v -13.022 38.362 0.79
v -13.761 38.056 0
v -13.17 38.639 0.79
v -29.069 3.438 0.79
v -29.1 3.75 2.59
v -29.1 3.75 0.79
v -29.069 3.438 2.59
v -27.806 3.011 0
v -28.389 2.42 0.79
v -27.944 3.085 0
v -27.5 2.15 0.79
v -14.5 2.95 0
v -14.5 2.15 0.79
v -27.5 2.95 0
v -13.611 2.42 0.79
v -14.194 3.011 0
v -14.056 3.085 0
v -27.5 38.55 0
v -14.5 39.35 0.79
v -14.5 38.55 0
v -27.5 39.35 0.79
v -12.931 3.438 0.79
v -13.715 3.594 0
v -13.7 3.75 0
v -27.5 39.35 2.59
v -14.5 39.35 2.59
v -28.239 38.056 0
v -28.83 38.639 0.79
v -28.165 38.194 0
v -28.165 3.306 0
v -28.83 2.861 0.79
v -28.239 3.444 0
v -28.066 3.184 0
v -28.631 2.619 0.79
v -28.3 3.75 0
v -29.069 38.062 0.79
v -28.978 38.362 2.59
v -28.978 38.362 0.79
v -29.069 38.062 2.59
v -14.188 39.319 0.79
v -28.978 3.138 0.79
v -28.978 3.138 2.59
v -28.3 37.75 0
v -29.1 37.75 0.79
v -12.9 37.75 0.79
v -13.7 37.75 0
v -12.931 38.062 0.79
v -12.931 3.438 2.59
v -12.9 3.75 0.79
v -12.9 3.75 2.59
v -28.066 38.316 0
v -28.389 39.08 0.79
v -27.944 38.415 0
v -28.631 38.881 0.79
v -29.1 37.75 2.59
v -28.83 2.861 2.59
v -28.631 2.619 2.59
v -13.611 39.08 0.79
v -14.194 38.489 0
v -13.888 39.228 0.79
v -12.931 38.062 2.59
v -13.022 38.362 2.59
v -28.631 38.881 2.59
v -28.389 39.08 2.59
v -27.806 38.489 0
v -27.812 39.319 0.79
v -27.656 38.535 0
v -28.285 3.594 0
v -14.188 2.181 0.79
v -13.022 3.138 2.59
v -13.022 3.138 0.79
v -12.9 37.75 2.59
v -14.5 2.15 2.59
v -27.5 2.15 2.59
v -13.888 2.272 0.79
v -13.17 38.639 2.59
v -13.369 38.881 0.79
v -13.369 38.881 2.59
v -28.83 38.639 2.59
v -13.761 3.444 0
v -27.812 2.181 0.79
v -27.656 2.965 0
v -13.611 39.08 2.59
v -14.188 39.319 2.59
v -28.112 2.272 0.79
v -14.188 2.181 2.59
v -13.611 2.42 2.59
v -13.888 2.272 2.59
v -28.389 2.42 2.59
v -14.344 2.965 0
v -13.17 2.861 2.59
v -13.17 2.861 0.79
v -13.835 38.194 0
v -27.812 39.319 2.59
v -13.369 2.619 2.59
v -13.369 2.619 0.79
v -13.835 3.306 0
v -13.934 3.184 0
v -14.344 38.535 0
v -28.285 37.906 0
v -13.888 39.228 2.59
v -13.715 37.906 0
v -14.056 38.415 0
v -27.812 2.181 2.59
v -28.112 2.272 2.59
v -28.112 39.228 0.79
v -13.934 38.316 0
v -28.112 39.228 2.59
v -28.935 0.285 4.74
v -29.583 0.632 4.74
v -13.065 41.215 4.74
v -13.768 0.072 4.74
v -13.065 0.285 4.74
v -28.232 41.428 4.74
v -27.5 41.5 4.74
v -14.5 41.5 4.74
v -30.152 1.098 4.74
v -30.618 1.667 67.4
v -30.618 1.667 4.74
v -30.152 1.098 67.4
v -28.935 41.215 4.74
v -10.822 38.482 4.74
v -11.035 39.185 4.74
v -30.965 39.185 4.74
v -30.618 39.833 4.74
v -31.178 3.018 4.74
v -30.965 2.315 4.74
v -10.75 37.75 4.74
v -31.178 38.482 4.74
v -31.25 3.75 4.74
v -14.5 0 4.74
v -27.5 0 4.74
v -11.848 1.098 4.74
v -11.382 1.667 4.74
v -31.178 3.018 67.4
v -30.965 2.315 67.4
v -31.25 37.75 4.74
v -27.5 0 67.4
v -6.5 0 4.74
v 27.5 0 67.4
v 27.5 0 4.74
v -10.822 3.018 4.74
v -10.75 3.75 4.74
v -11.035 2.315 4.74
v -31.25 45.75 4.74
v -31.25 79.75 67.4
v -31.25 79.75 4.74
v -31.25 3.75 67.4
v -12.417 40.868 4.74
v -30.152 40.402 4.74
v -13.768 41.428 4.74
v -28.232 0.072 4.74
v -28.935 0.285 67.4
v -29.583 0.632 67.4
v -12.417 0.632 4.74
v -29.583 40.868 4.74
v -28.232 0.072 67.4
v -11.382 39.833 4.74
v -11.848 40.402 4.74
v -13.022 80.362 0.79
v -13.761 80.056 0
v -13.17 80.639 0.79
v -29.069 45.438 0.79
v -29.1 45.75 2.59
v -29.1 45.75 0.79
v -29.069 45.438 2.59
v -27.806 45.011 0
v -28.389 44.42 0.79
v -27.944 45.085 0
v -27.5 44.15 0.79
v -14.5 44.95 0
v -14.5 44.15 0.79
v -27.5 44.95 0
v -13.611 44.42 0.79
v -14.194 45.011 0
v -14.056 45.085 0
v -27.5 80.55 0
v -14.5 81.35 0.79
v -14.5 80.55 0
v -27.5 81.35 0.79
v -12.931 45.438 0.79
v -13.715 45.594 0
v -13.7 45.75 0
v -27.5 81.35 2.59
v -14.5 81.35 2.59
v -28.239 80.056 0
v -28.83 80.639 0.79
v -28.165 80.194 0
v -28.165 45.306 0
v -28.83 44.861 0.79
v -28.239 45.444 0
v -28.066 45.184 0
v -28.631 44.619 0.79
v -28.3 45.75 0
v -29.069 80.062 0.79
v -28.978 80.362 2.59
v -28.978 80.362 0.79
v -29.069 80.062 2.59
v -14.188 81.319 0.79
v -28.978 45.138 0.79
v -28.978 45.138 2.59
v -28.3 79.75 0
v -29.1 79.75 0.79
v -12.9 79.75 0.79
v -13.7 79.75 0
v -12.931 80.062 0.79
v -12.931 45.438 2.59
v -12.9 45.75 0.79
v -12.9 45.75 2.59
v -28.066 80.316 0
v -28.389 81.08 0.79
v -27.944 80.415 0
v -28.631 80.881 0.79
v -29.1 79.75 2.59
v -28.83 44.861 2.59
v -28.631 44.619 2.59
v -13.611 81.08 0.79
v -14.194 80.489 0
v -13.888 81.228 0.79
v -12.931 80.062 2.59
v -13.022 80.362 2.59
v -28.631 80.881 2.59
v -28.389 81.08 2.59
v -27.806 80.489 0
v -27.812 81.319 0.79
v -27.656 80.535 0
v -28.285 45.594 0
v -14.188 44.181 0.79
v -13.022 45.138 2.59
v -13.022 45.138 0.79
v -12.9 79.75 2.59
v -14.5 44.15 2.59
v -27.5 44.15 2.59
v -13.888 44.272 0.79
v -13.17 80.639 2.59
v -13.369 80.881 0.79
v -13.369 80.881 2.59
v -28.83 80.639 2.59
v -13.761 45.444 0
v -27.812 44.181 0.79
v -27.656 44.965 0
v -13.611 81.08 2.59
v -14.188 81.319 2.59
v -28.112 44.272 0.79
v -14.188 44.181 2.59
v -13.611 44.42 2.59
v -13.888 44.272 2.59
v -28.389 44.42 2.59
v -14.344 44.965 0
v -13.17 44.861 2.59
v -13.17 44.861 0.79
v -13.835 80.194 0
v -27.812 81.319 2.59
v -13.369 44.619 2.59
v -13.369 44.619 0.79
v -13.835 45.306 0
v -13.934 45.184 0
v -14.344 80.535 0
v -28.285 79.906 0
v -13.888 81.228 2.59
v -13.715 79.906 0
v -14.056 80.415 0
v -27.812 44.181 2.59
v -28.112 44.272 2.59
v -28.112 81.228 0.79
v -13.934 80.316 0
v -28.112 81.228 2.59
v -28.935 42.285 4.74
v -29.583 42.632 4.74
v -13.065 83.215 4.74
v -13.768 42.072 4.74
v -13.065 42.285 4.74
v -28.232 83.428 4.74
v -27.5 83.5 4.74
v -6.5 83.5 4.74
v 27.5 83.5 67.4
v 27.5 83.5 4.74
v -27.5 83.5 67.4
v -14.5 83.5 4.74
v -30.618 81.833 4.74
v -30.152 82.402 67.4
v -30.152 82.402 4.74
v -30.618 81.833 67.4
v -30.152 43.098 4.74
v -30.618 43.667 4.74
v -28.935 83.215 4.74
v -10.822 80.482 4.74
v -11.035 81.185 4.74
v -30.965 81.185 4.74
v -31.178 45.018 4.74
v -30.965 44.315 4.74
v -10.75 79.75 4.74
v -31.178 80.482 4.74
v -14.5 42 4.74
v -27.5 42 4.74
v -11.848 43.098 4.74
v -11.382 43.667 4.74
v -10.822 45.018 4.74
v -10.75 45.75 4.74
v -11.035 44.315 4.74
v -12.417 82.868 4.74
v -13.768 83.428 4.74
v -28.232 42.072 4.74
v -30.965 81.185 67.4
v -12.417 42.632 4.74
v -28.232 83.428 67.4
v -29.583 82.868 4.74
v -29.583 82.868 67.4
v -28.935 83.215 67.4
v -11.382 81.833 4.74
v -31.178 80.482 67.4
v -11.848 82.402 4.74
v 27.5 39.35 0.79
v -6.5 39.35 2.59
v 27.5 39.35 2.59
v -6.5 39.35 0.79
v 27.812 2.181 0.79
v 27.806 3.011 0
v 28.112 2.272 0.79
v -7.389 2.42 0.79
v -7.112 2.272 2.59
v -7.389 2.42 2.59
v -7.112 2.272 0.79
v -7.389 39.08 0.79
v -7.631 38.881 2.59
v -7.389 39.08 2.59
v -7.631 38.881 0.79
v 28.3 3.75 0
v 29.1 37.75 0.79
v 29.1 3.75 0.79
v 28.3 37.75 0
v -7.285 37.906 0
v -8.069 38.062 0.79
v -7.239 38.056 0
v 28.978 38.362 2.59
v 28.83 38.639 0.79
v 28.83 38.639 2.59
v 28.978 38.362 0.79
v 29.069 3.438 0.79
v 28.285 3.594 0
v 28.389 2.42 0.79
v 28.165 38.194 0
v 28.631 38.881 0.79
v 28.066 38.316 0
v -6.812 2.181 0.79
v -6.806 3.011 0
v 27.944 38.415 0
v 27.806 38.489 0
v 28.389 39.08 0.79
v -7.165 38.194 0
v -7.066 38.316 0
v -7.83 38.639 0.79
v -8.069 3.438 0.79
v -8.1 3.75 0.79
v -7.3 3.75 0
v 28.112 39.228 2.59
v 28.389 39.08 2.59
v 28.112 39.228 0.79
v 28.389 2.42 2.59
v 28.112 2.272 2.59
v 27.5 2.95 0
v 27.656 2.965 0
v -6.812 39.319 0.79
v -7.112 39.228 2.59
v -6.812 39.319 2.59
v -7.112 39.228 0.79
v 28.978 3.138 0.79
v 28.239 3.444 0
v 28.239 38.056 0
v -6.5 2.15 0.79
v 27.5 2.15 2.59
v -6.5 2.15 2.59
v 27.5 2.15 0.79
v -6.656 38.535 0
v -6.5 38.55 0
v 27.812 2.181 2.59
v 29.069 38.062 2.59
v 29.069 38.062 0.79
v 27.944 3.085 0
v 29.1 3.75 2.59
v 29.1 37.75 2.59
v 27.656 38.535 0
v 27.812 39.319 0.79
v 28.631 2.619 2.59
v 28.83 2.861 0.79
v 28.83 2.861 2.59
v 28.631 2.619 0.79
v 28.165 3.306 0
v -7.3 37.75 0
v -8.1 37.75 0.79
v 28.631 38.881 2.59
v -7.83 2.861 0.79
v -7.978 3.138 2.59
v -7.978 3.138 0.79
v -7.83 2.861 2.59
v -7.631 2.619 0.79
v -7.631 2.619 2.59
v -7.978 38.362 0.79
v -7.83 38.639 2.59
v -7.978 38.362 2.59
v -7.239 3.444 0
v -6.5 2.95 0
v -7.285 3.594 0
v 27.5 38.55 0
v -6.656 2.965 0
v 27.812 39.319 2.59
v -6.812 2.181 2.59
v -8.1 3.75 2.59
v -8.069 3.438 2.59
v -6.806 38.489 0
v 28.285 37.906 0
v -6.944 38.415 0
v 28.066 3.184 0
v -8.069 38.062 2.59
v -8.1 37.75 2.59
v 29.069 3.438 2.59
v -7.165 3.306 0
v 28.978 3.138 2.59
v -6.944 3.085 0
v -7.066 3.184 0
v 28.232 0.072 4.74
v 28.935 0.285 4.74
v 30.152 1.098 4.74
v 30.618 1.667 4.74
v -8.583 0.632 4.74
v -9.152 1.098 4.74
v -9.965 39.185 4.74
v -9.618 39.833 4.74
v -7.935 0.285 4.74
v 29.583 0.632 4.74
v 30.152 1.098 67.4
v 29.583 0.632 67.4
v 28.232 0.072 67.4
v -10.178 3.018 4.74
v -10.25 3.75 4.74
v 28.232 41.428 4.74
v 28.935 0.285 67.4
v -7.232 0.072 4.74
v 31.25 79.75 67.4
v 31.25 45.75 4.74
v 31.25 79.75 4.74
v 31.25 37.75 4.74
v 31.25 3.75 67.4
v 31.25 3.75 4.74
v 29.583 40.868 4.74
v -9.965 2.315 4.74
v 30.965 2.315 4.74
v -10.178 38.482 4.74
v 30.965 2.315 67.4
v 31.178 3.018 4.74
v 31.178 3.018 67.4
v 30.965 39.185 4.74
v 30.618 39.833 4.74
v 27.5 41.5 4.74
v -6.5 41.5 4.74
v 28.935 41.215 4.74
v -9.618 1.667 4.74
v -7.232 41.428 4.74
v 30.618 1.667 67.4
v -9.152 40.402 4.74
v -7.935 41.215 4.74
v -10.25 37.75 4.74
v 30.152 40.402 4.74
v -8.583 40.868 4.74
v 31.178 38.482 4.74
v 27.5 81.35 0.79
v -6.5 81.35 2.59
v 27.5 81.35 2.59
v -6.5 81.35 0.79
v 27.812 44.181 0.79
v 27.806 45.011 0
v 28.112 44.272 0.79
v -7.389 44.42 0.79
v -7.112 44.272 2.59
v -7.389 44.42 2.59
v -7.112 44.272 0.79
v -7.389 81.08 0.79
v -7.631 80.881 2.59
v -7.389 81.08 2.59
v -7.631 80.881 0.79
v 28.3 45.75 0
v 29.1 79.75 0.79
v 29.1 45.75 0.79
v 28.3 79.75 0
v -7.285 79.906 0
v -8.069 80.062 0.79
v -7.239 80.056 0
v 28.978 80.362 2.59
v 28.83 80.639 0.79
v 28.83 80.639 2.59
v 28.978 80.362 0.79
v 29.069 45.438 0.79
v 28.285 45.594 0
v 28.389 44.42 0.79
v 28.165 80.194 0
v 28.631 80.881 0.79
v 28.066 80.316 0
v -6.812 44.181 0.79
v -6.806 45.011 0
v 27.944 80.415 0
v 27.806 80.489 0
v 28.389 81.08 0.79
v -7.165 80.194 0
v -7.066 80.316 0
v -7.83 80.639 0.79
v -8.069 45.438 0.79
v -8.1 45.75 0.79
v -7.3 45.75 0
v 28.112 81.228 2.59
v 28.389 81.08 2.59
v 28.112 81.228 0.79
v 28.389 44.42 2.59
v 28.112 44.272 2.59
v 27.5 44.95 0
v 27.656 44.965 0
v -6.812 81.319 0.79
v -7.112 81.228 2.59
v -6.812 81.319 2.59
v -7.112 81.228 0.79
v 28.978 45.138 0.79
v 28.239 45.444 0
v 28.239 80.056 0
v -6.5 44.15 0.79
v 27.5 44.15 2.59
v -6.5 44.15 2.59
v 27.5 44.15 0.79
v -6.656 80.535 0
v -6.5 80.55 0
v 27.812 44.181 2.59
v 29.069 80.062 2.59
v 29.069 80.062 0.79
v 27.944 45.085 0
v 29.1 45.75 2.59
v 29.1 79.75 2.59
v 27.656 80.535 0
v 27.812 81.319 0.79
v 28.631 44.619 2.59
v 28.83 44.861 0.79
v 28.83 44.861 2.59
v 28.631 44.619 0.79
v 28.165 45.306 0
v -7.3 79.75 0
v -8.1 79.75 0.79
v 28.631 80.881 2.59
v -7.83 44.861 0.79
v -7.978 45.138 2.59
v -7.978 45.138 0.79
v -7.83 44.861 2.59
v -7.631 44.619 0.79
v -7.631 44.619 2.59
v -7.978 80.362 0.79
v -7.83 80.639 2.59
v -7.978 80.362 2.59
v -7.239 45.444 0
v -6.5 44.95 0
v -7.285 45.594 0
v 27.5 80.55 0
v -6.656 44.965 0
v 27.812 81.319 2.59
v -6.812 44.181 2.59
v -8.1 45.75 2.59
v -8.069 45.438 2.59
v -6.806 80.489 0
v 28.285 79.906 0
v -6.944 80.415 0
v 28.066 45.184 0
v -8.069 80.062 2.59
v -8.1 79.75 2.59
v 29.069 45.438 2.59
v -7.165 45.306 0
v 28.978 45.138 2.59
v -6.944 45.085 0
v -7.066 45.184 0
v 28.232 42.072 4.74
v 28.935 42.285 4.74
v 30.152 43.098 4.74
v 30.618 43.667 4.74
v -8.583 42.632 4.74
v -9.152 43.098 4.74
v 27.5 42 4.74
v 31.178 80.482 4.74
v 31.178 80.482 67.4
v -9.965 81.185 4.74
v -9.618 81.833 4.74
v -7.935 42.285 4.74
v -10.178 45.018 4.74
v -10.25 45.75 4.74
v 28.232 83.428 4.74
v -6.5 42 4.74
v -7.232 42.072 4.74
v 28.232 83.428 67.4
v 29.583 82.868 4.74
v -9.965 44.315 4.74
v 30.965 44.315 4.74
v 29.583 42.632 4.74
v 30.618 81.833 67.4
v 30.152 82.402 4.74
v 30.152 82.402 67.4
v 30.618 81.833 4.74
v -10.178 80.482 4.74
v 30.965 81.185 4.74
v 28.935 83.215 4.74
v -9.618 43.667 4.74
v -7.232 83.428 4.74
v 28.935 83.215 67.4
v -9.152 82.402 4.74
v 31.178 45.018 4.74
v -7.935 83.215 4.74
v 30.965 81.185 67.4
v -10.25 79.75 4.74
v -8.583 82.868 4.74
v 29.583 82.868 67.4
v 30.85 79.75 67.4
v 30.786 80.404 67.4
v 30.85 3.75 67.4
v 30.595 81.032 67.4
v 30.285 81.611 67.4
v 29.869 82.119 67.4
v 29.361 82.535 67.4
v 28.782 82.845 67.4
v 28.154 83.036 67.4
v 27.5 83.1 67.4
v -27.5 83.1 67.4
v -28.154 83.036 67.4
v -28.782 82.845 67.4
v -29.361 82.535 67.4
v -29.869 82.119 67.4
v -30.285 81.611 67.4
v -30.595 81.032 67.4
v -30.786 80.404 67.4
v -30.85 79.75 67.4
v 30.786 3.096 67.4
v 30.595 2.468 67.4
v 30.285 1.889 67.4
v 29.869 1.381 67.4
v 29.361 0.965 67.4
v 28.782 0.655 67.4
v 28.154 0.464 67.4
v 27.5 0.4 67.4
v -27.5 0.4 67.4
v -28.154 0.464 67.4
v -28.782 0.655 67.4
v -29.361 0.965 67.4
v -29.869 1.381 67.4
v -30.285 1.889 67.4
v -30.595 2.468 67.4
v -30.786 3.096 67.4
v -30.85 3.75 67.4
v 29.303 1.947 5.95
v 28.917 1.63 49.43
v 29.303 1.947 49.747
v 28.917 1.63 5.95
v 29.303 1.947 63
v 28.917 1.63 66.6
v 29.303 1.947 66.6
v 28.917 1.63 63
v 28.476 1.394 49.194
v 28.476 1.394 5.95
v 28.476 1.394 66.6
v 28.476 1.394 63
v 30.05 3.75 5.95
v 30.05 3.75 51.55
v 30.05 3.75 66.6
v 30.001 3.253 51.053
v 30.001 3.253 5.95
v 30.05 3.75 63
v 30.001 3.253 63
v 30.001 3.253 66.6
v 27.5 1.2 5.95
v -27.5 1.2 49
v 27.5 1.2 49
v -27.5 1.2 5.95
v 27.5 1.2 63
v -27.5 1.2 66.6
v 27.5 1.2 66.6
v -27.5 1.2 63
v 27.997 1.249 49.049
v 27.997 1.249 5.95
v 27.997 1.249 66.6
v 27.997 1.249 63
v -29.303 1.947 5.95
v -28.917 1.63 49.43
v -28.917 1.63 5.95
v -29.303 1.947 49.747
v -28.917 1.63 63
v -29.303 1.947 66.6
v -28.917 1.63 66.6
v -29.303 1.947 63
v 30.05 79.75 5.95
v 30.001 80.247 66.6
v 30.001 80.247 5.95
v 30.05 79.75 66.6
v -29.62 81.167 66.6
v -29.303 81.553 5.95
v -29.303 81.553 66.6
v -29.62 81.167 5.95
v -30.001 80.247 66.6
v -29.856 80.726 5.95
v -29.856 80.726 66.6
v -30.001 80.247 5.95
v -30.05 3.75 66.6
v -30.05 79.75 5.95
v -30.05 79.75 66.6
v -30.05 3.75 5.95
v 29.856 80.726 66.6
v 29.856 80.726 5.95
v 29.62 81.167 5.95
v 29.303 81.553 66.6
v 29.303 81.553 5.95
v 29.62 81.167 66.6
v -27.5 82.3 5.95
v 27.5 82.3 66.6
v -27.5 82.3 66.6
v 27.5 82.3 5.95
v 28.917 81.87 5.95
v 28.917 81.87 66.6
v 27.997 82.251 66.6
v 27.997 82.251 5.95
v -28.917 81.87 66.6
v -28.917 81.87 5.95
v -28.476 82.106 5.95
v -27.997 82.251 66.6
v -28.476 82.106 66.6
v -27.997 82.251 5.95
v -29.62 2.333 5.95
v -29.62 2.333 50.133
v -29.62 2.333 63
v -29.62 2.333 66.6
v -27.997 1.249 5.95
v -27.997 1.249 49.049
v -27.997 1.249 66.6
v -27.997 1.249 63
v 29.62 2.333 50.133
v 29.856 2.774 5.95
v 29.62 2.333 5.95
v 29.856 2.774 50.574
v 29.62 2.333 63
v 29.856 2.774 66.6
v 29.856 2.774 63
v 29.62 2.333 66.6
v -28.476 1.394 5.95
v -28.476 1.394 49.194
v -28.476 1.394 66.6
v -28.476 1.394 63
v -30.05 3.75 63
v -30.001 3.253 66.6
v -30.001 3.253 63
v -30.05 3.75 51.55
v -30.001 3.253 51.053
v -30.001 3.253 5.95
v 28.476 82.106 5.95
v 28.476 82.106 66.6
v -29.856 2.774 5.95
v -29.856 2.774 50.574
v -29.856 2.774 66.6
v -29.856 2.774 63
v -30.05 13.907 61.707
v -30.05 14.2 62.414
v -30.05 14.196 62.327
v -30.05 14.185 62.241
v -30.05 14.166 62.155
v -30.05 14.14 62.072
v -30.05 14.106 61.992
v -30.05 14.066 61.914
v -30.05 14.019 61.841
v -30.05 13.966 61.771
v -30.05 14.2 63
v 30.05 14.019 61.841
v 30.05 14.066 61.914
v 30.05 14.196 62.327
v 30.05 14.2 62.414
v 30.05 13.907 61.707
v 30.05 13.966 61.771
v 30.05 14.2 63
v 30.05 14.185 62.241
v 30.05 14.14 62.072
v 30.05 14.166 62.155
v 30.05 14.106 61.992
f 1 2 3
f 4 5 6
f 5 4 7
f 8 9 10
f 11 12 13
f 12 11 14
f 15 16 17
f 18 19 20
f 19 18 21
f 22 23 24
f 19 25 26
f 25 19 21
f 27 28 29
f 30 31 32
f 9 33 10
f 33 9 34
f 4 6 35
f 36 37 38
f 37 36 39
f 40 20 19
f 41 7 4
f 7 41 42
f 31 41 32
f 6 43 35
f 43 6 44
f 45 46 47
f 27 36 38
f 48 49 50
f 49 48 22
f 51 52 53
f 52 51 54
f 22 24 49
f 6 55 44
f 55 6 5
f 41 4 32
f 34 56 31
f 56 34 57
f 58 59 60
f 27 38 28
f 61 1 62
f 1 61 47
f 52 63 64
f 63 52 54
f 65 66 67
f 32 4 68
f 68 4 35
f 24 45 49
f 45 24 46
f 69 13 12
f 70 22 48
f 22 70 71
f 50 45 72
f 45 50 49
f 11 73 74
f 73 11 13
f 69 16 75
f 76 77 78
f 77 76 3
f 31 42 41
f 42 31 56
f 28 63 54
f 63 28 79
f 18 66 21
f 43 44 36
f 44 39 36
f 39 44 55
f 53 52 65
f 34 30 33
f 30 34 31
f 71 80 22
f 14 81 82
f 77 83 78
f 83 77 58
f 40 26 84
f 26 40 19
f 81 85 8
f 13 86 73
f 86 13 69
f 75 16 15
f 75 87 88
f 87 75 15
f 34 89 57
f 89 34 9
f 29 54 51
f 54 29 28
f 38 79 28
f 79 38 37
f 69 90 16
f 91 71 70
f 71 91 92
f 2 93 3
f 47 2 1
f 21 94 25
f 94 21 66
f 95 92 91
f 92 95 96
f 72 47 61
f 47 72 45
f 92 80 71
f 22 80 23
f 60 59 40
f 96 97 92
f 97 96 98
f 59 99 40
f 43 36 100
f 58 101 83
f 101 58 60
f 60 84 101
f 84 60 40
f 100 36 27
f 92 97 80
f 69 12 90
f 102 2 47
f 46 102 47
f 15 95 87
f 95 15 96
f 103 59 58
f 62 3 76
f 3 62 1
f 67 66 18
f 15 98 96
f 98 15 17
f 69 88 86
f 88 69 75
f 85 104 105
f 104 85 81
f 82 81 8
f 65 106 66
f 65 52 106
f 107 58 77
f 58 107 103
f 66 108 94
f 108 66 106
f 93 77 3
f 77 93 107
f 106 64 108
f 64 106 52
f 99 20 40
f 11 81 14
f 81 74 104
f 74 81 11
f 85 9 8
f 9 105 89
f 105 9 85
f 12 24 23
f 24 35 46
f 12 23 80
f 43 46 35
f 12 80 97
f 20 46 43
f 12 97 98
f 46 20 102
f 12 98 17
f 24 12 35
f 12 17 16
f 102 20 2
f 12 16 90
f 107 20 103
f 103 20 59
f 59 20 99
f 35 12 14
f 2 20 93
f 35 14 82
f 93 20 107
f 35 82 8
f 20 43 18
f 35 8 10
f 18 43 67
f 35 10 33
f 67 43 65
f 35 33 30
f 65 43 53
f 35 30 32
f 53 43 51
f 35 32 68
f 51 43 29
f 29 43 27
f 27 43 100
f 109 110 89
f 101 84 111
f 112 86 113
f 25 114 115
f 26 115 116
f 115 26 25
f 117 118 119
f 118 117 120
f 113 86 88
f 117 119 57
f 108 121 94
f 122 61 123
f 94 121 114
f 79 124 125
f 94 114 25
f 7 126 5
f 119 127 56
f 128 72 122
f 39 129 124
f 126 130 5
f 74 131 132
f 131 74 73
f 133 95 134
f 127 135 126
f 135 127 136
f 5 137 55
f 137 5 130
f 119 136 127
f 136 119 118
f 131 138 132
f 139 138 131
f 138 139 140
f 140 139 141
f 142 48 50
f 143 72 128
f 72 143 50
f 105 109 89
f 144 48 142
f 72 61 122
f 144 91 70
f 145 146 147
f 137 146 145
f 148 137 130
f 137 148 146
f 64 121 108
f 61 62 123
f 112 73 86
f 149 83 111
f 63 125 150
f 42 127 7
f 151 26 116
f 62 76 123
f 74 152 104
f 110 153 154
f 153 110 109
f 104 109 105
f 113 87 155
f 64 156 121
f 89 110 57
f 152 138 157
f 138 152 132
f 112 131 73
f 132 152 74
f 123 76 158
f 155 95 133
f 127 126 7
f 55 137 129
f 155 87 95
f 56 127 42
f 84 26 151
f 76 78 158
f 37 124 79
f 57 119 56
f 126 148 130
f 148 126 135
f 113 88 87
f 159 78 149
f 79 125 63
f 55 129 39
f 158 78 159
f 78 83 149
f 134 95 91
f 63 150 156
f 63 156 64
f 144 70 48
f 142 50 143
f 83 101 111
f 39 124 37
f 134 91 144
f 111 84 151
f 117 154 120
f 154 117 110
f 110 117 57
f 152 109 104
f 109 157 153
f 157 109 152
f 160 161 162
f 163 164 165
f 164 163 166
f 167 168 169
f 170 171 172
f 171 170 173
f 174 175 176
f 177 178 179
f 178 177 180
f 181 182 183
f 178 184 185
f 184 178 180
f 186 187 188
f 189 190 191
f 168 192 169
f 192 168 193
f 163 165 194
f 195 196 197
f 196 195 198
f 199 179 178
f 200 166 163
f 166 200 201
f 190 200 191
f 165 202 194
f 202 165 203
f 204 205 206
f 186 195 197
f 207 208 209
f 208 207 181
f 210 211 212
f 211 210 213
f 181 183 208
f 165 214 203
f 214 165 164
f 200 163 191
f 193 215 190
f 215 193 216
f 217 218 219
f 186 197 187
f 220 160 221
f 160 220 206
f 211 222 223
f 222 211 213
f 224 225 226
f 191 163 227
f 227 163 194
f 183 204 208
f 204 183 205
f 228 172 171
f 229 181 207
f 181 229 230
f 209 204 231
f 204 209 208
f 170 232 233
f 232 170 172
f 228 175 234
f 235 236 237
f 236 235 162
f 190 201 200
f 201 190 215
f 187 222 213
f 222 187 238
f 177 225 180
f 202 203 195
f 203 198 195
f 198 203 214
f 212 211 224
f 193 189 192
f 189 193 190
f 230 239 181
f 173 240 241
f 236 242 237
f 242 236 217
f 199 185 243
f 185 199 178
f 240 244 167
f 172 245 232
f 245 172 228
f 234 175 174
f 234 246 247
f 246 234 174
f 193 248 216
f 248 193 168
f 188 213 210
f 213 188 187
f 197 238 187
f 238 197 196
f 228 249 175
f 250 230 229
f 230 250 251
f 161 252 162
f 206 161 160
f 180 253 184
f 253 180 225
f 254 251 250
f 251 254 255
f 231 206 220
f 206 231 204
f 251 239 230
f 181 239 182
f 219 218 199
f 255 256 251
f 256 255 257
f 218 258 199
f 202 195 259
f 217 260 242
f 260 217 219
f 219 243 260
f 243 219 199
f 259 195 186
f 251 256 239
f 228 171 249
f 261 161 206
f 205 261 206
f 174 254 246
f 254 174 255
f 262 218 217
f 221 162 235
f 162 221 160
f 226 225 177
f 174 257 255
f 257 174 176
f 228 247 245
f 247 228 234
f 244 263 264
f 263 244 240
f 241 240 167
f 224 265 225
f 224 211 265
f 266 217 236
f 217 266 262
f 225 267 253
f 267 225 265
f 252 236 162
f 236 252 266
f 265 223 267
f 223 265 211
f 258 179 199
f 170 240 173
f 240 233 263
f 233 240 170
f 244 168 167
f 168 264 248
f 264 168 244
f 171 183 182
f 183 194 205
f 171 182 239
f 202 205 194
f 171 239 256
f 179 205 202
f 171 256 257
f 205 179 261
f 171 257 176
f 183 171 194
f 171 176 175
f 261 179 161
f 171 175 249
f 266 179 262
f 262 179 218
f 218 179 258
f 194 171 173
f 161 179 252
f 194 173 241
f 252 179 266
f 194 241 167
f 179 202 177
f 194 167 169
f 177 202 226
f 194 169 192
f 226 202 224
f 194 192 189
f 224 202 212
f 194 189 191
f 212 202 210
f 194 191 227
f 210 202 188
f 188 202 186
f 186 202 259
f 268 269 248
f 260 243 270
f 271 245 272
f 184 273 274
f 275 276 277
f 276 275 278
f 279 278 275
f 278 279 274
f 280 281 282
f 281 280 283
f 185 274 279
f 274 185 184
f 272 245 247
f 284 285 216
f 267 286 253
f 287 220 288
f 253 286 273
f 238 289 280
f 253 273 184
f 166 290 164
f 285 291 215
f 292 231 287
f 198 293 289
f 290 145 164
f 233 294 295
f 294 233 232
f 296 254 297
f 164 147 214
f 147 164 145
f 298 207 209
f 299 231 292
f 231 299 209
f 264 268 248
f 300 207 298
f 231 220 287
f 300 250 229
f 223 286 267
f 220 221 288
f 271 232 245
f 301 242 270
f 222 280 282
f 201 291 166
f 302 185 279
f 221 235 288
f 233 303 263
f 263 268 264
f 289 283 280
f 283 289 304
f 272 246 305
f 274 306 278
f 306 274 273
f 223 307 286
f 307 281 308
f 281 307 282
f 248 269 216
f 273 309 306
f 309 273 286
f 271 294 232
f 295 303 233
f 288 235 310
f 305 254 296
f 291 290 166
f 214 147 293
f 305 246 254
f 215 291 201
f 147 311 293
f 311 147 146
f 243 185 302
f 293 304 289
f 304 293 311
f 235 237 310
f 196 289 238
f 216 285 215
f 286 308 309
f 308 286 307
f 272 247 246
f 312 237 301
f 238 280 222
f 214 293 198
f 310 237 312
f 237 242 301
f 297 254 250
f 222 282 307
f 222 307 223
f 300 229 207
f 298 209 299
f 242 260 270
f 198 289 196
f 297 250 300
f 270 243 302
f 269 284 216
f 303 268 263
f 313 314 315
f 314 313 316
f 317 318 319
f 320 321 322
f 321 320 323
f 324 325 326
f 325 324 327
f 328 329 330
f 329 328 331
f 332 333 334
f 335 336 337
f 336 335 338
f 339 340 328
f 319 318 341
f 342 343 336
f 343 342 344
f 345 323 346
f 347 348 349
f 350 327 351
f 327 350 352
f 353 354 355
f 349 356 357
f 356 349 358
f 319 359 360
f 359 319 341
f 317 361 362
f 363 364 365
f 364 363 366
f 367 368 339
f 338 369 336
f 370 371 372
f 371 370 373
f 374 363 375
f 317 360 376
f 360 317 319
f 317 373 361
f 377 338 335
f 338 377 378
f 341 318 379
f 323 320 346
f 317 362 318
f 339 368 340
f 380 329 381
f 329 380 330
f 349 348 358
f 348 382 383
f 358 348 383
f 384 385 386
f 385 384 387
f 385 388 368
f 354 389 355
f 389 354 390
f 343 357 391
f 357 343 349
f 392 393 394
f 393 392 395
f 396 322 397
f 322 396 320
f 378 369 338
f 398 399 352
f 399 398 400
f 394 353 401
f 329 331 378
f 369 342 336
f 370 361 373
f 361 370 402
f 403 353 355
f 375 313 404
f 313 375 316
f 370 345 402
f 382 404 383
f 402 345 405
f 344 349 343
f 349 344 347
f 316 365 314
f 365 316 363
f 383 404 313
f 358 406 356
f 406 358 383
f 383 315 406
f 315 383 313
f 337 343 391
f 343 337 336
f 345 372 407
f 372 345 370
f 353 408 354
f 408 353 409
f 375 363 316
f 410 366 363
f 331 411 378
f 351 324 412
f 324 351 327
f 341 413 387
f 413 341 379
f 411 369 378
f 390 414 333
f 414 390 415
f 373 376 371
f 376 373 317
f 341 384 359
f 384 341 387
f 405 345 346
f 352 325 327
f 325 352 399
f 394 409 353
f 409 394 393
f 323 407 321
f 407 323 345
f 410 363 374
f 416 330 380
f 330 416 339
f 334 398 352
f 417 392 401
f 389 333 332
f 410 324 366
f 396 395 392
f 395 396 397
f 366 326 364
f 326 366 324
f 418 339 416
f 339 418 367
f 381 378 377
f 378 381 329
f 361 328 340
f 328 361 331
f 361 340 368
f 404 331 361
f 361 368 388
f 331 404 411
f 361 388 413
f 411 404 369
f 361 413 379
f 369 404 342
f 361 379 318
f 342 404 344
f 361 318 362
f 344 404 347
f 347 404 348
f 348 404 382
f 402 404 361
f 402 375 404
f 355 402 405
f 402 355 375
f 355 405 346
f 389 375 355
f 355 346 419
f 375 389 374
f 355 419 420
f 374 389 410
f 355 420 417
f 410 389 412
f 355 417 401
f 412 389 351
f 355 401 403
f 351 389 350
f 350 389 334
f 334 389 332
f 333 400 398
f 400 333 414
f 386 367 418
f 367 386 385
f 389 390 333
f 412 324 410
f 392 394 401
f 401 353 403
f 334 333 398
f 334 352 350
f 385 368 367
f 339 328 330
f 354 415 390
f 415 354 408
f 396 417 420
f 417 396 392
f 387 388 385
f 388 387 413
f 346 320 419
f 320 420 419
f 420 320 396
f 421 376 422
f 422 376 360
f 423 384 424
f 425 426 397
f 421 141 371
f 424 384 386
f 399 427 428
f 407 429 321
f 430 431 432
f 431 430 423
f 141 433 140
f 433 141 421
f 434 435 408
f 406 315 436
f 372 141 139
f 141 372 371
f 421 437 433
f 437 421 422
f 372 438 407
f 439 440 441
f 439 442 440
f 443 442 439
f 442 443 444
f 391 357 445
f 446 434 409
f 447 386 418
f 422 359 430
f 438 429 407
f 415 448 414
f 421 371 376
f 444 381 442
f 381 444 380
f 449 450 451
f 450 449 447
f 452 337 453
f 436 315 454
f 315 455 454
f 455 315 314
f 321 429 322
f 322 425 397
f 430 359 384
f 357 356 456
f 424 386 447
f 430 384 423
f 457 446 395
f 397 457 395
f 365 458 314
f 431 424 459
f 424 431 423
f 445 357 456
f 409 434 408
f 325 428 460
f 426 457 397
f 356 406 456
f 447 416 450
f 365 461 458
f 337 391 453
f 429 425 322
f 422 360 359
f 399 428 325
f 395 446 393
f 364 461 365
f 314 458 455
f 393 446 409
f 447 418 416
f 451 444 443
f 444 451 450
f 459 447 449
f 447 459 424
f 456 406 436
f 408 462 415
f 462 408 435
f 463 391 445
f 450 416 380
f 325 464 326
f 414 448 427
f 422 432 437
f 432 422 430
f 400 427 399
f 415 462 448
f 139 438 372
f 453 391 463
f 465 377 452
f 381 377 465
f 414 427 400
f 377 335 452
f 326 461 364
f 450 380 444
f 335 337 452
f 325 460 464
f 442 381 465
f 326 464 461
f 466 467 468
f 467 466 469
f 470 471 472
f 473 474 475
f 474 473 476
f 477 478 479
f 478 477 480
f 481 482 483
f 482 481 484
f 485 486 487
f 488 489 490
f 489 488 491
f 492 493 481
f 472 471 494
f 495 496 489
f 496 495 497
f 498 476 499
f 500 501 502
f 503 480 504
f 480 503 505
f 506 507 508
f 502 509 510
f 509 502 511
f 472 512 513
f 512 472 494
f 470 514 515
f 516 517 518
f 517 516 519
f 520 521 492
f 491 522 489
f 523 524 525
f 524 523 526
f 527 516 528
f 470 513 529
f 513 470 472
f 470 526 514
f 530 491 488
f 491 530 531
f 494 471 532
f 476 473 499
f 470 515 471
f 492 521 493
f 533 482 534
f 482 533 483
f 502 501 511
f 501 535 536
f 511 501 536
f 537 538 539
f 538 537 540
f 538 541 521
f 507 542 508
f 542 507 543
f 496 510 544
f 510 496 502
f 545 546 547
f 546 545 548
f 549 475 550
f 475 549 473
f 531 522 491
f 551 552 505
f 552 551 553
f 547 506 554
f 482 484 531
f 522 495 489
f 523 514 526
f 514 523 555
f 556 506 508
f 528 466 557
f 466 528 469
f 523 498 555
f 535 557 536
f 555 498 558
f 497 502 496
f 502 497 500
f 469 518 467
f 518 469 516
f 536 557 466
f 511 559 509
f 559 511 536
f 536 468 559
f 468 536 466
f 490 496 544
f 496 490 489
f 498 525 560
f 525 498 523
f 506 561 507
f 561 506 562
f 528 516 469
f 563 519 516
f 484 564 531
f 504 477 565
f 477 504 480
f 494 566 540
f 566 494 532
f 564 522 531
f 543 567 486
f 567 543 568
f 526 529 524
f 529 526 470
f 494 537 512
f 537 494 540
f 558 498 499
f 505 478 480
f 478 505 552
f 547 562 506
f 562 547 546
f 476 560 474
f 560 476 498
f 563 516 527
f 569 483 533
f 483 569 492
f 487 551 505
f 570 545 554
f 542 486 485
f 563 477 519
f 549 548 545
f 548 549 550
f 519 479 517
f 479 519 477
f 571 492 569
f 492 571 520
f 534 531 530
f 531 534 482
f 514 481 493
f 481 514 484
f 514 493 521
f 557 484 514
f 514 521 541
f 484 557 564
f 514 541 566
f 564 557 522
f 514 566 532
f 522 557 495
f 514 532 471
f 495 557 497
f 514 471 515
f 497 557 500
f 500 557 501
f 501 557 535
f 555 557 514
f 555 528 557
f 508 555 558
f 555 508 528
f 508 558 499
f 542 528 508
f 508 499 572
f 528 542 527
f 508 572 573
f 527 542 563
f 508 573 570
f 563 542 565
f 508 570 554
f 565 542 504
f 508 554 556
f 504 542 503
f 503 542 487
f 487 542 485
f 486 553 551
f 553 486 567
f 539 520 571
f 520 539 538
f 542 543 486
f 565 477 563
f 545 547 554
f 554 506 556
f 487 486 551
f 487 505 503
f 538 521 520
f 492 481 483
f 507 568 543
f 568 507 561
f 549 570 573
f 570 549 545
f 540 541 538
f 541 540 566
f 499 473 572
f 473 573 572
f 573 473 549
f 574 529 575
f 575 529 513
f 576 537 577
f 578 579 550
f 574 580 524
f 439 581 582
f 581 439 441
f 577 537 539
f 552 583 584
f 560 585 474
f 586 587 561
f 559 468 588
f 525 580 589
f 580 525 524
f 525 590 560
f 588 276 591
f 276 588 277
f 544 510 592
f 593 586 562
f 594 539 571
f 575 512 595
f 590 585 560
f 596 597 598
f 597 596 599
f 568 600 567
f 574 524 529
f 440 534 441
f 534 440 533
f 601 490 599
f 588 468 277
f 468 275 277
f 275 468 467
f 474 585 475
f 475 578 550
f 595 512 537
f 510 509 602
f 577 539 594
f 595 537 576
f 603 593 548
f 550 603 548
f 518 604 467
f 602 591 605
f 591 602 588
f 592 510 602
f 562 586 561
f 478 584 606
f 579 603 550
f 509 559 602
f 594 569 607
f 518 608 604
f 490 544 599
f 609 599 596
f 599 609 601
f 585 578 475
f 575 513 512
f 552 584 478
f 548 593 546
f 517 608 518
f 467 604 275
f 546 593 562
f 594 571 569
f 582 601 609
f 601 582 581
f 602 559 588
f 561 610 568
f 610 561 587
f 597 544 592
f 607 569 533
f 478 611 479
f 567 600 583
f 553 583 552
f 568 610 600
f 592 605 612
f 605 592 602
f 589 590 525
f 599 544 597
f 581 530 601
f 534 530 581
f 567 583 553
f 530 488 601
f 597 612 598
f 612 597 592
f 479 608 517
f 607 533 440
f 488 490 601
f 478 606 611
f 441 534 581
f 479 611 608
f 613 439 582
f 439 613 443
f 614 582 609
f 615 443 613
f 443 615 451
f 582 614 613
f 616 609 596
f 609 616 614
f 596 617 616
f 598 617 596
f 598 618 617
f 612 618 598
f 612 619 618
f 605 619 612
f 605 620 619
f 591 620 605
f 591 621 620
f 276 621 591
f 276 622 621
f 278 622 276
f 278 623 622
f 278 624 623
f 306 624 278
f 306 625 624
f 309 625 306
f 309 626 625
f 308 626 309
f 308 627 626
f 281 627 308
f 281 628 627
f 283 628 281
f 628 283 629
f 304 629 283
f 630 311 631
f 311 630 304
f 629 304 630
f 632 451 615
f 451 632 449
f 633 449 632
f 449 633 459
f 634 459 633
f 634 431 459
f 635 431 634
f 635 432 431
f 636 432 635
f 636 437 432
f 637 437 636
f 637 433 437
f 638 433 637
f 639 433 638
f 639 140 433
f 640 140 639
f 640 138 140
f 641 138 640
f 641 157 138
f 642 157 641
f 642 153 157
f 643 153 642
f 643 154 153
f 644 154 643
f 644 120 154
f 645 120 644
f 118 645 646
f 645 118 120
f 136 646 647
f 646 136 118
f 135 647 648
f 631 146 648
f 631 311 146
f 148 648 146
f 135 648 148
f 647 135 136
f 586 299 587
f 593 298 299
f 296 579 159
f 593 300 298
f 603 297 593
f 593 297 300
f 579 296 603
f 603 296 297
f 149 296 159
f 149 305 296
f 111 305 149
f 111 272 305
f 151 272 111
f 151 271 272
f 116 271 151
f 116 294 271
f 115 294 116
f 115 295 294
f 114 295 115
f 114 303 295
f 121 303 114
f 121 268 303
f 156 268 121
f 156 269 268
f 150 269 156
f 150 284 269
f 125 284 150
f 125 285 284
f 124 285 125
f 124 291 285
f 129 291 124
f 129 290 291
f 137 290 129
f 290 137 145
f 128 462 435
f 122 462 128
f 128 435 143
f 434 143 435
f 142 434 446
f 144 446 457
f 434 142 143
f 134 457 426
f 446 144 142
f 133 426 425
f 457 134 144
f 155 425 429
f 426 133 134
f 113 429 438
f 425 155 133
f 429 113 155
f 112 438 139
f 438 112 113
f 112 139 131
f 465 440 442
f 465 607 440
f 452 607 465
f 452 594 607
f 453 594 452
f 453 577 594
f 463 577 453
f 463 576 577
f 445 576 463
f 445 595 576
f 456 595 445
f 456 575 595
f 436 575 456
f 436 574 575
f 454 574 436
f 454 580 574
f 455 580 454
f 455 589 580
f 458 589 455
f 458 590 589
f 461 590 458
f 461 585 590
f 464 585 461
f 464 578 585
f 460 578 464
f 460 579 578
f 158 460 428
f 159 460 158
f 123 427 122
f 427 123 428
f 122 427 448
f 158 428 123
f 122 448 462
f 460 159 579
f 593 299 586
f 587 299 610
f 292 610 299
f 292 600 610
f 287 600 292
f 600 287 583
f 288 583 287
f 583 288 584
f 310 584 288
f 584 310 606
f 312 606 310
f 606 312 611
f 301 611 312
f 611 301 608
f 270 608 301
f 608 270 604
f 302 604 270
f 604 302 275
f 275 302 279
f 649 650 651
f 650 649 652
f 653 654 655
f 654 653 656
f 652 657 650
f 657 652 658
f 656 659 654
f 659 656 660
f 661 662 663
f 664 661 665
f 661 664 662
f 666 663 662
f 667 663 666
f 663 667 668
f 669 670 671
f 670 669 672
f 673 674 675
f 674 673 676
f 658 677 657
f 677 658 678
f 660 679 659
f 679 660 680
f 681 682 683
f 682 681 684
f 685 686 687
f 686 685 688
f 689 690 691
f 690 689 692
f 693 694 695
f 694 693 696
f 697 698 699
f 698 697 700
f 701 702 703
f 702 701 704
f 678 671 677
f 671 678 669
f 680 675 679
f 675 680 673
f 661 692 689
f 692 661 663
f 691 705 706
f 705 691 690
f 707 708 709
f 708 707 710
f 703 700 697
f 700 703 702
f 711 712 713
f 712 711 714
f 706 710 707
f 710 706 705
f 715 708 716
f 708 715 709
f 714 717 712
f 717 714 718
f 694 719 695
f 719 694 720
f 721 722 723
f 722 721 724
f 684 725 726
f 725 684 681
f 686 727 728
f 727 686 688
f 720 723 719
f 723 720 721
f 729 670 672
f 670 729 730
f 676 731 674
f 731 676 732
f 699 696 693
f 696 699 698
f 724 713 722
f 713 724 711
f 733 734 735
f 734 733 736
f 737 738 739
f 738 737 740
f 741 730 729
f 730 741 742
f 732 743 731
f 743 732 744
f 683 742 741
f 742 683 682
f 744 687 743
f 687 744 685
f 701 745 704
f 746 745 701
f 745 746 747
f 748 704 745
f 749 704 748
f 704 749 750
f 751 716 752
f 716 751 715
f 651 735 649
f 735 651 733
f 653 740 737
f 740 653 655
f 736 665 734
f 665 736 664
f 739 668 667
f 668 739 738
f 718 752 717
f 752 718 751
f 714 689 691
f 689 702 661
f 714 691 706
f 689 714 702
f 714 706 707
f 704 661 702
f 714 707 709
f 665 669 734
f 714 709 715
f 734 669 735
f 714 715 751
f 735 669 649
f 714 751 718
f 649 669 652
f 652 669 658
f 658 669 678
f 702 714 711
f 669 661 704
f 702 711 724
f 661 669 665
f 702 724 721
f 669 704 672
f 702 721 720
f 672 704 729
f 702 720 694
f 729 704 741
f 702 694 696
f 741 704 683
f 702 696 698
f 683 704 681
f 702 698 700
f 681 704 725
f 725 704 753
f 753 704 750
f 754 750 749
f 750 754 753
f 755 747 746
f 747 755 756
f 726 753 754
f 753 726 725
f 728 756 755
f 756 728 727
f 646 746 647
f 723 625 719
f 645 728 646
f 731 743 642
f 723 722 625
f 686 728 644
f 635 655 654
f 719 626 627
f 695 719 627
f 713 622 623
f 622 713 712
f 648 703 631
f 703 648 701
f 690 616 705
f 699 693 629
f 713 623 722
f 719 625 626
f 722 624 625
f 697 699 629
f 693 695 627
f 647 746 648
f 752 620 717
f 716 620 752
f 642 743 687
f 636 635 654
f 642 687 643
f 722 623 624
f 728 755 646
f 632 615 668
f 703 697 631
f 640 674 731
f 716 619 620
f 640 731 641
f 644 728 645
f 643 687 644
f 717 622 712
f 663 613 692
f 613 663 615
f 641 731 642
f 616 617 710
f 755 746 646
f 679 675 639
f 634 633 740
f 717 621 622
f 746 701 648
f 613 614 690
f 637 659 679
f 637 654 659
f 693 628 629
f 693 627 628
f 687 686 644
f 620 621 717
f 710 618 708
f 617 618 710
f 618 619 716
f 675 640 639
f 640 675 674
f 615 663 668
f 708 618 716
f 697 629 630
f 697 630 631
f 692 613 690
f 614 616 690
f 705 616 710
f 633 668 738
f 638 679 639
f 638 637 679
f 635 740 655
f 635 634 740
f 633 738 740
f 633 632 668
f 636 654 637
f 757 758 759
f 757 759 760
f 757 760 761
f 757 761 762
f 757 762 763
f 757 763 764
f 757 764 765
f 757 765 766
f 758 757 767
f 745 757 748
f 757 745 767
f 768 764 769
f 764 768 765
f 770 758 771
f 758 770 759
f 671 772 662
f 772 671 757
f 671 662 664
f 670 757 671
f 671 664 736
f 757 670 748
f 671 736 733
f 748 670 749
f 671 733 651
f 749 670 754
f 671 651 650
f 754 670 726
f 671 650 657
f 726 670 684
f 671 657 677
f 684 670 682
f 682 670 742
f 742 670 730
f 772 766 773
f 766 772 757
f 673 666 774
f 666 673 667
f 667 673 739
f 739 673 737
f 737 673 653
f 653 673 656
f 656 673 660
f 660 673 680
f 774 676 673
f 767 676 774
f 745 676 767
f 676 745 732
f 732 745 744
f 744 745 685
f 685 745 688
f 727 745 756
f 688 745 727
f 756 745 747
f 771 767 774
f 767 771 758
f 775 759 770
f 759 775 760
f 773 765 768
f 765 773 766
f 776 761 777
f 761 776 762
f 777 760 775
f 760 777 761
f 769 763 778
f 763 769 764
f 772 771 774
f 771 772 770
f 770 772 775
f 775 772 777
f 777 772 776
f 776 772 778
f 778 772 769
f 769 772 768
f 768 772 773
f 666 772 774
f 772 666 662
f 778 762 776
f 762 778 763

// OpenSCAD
// file: ../../../modules/gridfinity.scad
// Gridfinity ベースプレートの共有 module。
// 寸法は Gridfinity 仕様 (Zack Freedman) の baseplate 輪郭に従う:
//   ピッチ 42、ソケット上端開口 41.5 (角 R4)、上から 45° 面取り 2.15 →
//   垂直 1.8 (37.2 角・R1.85) → 45° 面取り 0.7 → 底 35.8 角 (R1.15)。
//   ソケット深さ = 2.15 + 1.8 + 0.7 = 4.65。
//
// 座標系: X が列方向 (中央が 0)、Y が行方向 (板の前端が 0)、Z=0 が板の底面。
// 板の外形は grid とは独立に rim で与えるので、grid より大きい板 (縁付き) を
// 作れる。ソケットは rim=[left, right, front, back] の内側へ 42 ピッチで並ぶ。

gf_pitch = 42;
gf_socket_top = 41.5; // 上端開口
gf_socket_mid = 37.2; // 垂直部
gf_socket_bot = 35.8; // 底
gf_socket_r_top = 4;
gf_socket_r_mid = 1.85;
gf_socket_r_bot = 1.15;
gf_chamfer_top = 2.15;
gf_wall_h = 1.8;
gf_chamfer_bot = 0.7;
gf_socket_depth = gf_chamfer_top + gf_wall_h + gf_chamfer_bot; // 4.65
gf_fn = 32;
gf_eps = 0.01; // hull 用の薄板の厚さ
gf_over = 0.5; // 切削の抜き代

// 角丸正方形または矩形 (w は一辺、または [幅, 奥行き]、角 R)
module
gf_rounded_square(w, r)
{
    offset(r = r, $fn = gf_fn)
        square(is_list(w) ? w - [ 2 * r, 2 * r ] : w - 2 * r, center = true);
}

// 厚さ gf_eps の角丸正方形の薄板を z に置く (hull の骨)
module
gf_slab(w, r, z)
{
    translate([ 0, 0, z ]) linear_extrude(gf_eps) gf_rounded_square(w, r);
}

// ソケット1個の切削体。z=0 がソケットの底 (床の天面)、+Z へ 4.65 で天面に出る。
// clearance は嵌合の逃げで、輪郭を全周へ clearance だけ外へ出す (幅 +2c、角 R
// +c)。pitch_x は X 方向のセル幅。端数でも角 R と面取りの寸法を保つ。
module
gf_socket_cut(clearance = 0, pitch_x = gf_pitch)
{
    z1 = gf_chamfer_bot;
    z2 = z1 + gf_wall_h;
    z3 = gf_socket_depth;
    c = clearance;
    assert(pitch_x > gf_pitch - gf_socket_top + 2 * gf_socket_r_top,
           "Cell width is too small for the socket corner radius");
    delta = [ pitch_x - gf_pitch, 0 ];
    bot = [ gf_socket_bot + 2 * c, gf_socket_bot + 2 * c ] + delta;
    mid = [ gf_socket_mid + 2 * c, gf_socket_mid + 2 * c ] + delta;
    top = [ gf_socket_top + 2 * c, gf_socket_top + 2 * c ] + delta;
    hull()
    {
        gf_slab(bot, gf_socket_r_bot + c, 0);
        gf_slab(mid, gf_socket_r_mid + c, z1 - gf_eps);
    }
    hull()
    {
        gf_slab(mid, gf_socket_r_mid + c, z1 - gf_eps);
        gf_slab(mid, gf_socket_r_mid + c, z2 - gf_eps);
    }
    hull()
    {
        gf_slab(mid, gf_socket_r_mid + c, z2 - gf_eps);
        gf_slab(top, gf_socket_r_top + c, z3 - gf_eps);
    }
    // 天面より上へ抜く (天面と同一平面の退化した面を残さない)
    gf_slab(top, gf_socket_r_top + c, z3 - gf_eps);
    translate([ 0, 0, z3 - gf_eps ]) linear_extrude(gf_over + gf_eps)
        gf_rounded_square(top, gf_socket_r_top + c);
}

// ベースプレート。cols x rows のソケットを床 floor_t の上に彫る。
// rim = [left, right, front, back] はソケット列の外側に残す縁の幅。
// 板の幅 = cols*42 + left + right、奥行き = rows*42 + front + back。
// cols の端数は左端の細幅セルになる。rows は正の整数。
// clearance はソケットの嵌合の逃げ (gf_socket_cut を参照)。
module
gf_baseplate(cols, rows, rim = [ 0, 0, 0, 0 ], floor_t = 1, clearance = 0)
{
    grid_w = cols * gf_pitch;
    grid_d = rows * gf_pitch;
    plate_w = grid_w + rim[0] + rim[1];
    plate_d = grid_d + rim[2] + rim[3];
    x0 = -plate_w / 2 + rim[0]; // ソケット列の左端
    first_pitch = grid_w - (ceil(cols) - 1) * gf_pitch;
    difference()
    {
        translate([ -plate_w / 2, 0, 0 ])
            cube([ plate_w, plate_d, floor_t + gf_socket_depth ]);
        for (c = [0:ceil(cols) - 1], r = [0:rows - 1])
            translate([
                x0 + (c == 0 ? first_pitch / 2
                             : first_pitch + (c - 0.5) * gf_pitch),
                rim[2] + (r + 0.5) * gf_pitch,
                floor_t
            ]) gf_socket_cut(clearance, c == 0 ? first_pitch : gf_pitch);
    }
}
// file: ../../../modules/gridfinity_bins.scad
include <gridfinity_bin.scad>

// assets/gridfinity-bin/ の bin 群の共通値と、サイズ 3 引数の払い出し口。
// 単体では何も描かない。設計の経緯と確定値は
// ledger/designs/gridfinity-bin-4u.md が正本。
// 通常binは4U/9U、X={1,1.5,2,2.5,3} × Y={1,2,3,4,5,5.5}。
// 両軸に端数を持つ組み合わせはassetに置かない（各高さ28種）。
// Xが横、Yがラベルの壁から奥、unitsが高さ（7mm単位）。
wall = 1.2;    // 0.4 ノズル 3 本
floor_t = 1.2; // 底 (4.75) の上に載せる床。床の天面 z = 5.95
label_d = 13;  // 12mm 幅のラベルシールを貼る天板の張り出し
label_t = 1; // 天板の厚さ (user 指定)。下は 45° の無垢のくさび
label_r = 1; // 天板の先端と 45° 面の境目の R (user 指定)
// カードケース (goods/card_case_2x3x4u.scad) の値。カードは ISO/IEC 7810 ID-1 (85.6 × 54 ×
// 0.76、隅 R3) で、長辺を Y (rows 方向) に寝かせ、X 中央・手前の壁から 10 奥に置く。ポケットは
// カードより 1 大きい (片側 0.5)。右奥のマスは壁の内面まで抜き、床と底を外形に平行な 45° の窪みにする。
// ポケットの左右の埋めの天面 (幅 13.05) が 12mm のラベルを貼る帯。ポケットと穴の交点の
// 縦エッジは丸める (開口の上縁は丸めない: 壁を上端まで垂直に保ち、収まる枚数を減らさない)
card_w = 54;    // カードの短辺 (X)。user 指定「高さ 54」
card_d = 85.6;  // カードの長辺 (Y)。user 指定「幅 85.6」
card_clear = 1; // ポケットの余裕 (user 指定「+1mm」)
// ポケットの手前の辺の、手前の壁の内面からの距離 (user 指定「10mm」)
card_off = 10;
// ポケットの平面の隅 R (user 指定「角の丸み 3mm」。ID-1 の隅は 2.88..3.48)
card_r = 3;
// ポケットと穴が交わる所の、埋めの凸の縦エッジの R (指の当たる角)
card_edge_r = 2;
recess_skin = floor_t + 1.75; // 窪みの床 z (底の皮)。user 指定「壁厚と同じ 1.2 は過剰、1.75 返す」

function bin_contract(cols, rows, units) = str("CONTRACT units=",
                                               units,
                                               " pitch=",
                                               gf_pitch,
                                               " outer=",
                                               gfb_outer,
                                               " h=",
                                               units* gfb_unit,
                                               " lip=",
                                               gfb_lip_h,
                                               " base=",
                                               gfb_base_bot,
                                               "/",
                                               gfb_base_mid,
                                               "/",
                                               gfb_outer,
                                               " base_h=",
                                               gfb_base_h,
                                               " wall=",
                                               wall,
                                               " floor_top=",
                                               gfb_base_h + floor_t,
                                               " label=",
                                               label_d,
                                               "x",
                                               label_t,
                                               " wedge=45 fillet=",
                                               label_r,
                                               " bin=",
                                               cols,
                                               "x",
                                               rows,
                                               " size=",
                                               cols* gf_pitch - 0.5,
                                               "x",
                                               rows* gf_pitch - 0.5);

// (cols, rows, units) でラベル付き bin を払い出す。例: gridfinity_bin(2, 4, 4)
module
gridfinity_bin(cols, rows, units = 4)
{
    echo(bin_contract(cols, rows, units));
    gfb_bin(cols, rows, units, wall, floor_t, label_d, label_t, label_r);
}

function card_contract(cols, rows, units) = str("CONTRACT card units=",
                                                units,
                                                " bin=",
                                                cols,
                                                "x",
                                                rows,
                                                " size=",
                                                cols* gf_pitch - 0.5,
                                                "x",
                                                rows* gf_pitch - 0.5,
                                                " h=",
                                                units* gfb_unit,
                                                " lip=",
                                                gfb_lip_h,
                                                " floor_top=",
                                                gfb_base_h + floor_t,
                                                " card=",
                                                card_w,
                                                "x",
                                                card_d,
                                                " pocket=",
                                                card_w + card_clear,
                                                "x",
                                                card_d + card_clear,
                                                " at=",
                                                -(card_w + card_clear) / 2,
                                                ",",
                                                wall + card_off,
                                                " hole=",
                                                (cols - 1) / 2 * gf_pitch - gfb_outer / 2,
                                                ",",
                                                (rows - 0.5) * gf_pitch - 0.25 - gfb_outer / 2,
                                                " hole_r=",
                                                gfb_outer_r - wall,
                                                " recess=",
                                                gfb_outer - 2 * wall,
                                                "/",
                                                gfb_base_mid - 2 * wall,
                                                " recess_floor=",
                                                recess_skin,
                                                " r=",
                                                card_r,
                                                " edge_r=",
                                                card_edge_r);

// (cols, rows, units) でカードケースを払い出す。例: gridfinity_card_case(2, 3, 4)
module
gridfinity_card_case(cols, rows, units = 4)
{
    echo(card_contract(cols, rows, units));
    gfb_card_case(cols,
                  rows,
                  units,
                  wall,
                  floor_t,
                  [ card_w, card_d ],
                  card_clear,
                  card_off,
                  card_r,
                  recess_skin,
                  card_edge_r);
}
// main file
include <../../../modules/gridfinity_bins.scad>

gridfinity_bin(1.5, 2, 9);
